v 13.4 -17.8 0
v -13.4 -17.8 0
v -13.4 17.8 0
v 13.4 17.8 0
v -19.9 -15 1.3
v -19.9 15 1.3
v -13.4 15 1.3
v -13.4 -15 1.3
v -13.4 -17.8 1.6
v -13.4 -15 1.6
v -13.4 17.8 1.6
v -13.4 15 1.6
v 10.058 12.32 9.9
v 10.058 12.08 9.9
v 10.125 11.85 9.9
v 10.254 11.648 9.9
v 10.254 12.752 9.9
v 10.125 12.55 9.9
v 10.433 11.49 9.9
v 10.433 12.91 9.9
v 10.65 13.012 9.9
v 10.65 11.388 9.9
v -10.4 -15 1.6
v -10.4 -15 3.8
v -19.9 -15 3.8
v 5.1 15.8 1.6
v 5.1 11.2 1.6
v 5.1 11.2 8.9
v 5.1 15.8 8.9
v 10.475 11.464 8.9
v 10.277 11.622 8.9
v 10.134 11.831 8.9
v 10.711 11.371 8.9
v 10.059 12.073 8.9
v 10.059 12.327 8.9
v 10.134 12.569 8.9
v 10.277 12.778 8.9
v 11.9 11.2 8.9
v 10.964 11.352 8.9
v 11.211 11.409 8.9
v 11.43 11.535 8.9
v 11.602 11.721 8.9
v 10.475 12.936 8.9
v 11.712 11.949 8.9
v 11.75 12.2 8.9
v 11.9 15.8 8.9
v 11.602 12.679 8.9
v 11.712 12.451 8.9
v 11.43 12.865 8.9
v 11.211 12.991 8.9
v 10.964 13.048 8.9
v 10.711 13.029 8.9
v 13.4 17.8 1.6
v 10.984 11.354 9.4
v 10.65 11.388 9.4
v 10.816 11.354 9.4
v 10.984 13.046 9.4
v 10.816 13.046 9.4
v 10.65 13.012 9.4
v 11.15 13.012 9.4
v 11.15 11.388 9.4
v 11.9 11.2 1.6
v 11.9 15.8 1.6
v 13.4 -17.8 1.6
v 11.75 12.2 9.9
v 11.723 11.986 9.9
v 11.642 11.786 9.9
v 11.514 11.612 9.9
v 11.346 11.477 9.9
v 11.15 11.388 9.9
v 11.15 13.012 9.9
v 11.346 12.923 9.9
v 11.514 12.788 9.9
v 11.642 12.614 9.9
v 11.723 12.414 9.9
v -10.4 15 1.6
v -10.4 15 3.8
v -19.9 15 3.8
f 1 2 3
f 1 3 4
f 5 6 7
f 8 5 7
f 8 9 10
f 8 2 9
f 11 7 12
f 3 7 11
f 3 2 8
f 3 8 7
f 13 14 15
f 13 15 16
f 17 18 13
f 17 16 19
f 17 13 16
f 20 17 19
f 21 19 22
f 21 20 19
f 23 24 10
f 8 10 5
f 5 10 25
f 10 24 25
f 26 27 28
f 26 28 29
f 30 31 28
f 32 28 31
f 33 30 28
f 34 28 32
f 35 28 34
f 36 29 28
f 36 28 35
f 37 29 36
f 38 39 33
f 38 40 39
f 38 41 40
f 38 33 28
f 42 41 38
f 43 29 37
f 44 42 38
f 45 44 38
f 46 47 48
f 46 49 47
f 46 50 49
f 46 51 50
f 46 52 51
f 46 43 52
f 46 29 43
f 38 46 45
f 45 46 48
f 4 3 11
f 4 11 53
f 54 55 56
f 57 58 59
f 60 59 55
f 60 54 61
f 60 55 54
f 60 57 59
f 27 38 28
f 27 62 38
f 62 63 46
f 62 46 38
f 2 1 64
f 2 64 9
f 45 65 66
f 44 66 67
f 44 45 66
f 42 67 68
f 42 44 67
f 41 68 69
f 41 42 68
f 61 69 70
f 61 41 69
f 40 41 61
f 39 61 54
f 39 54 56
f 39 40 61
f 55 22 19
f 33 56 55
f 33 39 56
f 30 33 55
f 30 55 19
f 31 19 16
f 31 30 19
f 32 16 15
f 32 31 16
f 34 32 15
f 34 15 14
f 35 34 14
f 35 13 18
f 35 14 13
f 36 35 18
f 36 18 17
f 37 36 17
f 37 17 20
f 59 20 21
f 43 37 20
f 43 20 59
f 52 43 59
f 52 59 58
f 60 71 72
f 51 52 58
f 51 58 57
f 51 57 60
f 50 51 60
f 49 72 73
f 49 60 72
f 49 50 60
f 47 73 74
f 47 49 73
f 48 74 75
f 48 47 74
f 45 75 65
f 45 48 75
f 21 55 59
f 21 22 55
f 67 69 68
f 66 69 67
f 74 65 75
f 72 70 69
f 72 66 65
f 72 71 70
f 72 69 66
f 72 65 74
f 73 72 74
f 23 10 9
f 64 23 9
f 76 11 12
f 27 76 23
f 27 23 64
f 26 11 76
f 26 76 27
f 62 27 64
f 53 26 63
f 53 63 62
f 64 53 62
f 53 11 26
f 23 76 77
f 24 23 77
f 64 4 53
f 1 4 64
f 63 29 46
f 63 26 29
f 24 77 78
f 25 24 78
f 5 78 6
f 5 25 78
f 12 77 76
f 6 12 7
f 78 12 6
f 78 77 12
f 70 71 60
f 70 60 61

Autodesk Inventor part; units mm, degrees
ref_plane "YZ Plane" through (0, 0, 0) normal (1, 0, 0) x (0, 1, 0)
ref_plane "XZ Plane" through (0, 0, 0) normal (0, 1, 0) x (-1, 0, 0)
ref_plane "XY Plane" through (0, 0, 0) normal (0, 0, 1) x (1, 0, 0)
sketch "Sketch1" plane through (0, 0, 0) normal (0, 0, 1) x (1, 0, 0)
  line L0 (-18.76, 0) -> (18.76, 0) construction
  line L1 (0, -24.92) -> (0, 24.92) construction
  line L2 (-13.4, 17.8) -> (13.4, 17.8)
  line L3 (13.4, 17.8) -> (13.4, -17.8)
  line L4 (13.4, -17.8) -> (-13.4, -17.8)
  line L5 (-13.4, -17.8) -> (-13.4, 17.8)
  point P0 (0, 0)
  point P1 (13.4, 0)
  point P2 (0, 17.8)
  dimension "d0" = 26.8
  dimension "d1" = 35.6
extrude "Extrusion1" add sketch "Sketch1" along normal blind 1.6
sketch "Sketch3" plane through (0, 0, 1.6) normal (0, 0, 1) x (1, 0, 0)
  line L0 (5.1, 15.8) -> (11.9, 15.8)
  line L1 (11.9, 15.8) -> (11.9, 11.2)
  line L2 (11.9, 11.2) -> (5.1, 11.2)
  line L3 (5.1, 11.2) -> (5.1, 15.8)
  line L4 (13.4, 17.8) -> (-13.4, 17.8) projected
  line L5 (13.4, -17.8) -> (13.4, 17.8) projected
  point P0 (0, 0)
  dimension "d4" = 2
  dimension "d5" = 1.5
  dimension "d6" = 6.8
  dimension "d7" = 4.6
extrude "Extrusion2" add sketch "Sketch3" along normal blind 7.3
sketch "Sketch4" plane through (0, 0, 8.9) normal (0, 0, 1) x (1, 0, 0)
  circle A0 centre (10.9, 12.2) radius 0.85
  line L0 (5.1, 11.2) -> (11.9, 11.2) projected
  line L1 (11.9, 11.2) -> (11.9, 15.8) projected
  point P0 (0, 0)
  dimension "d10" = 1.7
  dimension "d11" = 1
  dimension "d12" = 1
extrude "Extrusion3" add sketch "Sketch4" along normal blind 1
sketch "Sketch5" plane through (10.9, 12.2, 9.9) normal (0, 0, 1) x (1, 0, 0)
  circle A0 centre (0, 0) radius 0.85 projected
  line L0 (-0.25, 1.1875) -> (0.25, 1.1875)
  line L1 (0.25, 1.1875) -> (0.25, -1.2526)
  line L2 (0.25, -1.2526) -> (-0.25, -1.2526)
  line L3 (-0.25, -1.2526) -> (-0.25, 1.1875)
  point P0 (-10.9, -12.2)
  point P1 (0, -1.2526)
  dimension "d15" = 0.5
extrude "Extrusion4" cut sketch "Sketch5" against normal blind 0.5 contours L1 A0 L3 | A0 L3 L0 L1 | L1 L2 L3 A0
sketch "Sketch6" plane through (0, 0, 0) normal (0, 1, 0) x (-1, 0, 0)
  line L0 (19.9, 1.3) -> (10.4, 1.3)
  line L1 (10.4, 1.3) -> (10.4, 3.8)
  line L2 (10.4, 3.8) -> (19.9, 3.8)
  line L3 (19.9, 3.8) -> (19.9, 1.3)
  line L4 (-13.4, 1.6) -> (13.4, 1.6) projected
  line L5 (13.4, 0) -> (13.4, 1.6) projected
  point P0 (0, 0)
  dimension "d18" = 0.3
  dimension "d19" = 2.5
  dimension "d20" = 6.5
  dimension "d21" = 3
extrude "Extrusion5" add sketch "Sketch6" along normal mid plane 30
equation "\"d12\" = d11"
properties part number "P121" material "ABS Plastic"
